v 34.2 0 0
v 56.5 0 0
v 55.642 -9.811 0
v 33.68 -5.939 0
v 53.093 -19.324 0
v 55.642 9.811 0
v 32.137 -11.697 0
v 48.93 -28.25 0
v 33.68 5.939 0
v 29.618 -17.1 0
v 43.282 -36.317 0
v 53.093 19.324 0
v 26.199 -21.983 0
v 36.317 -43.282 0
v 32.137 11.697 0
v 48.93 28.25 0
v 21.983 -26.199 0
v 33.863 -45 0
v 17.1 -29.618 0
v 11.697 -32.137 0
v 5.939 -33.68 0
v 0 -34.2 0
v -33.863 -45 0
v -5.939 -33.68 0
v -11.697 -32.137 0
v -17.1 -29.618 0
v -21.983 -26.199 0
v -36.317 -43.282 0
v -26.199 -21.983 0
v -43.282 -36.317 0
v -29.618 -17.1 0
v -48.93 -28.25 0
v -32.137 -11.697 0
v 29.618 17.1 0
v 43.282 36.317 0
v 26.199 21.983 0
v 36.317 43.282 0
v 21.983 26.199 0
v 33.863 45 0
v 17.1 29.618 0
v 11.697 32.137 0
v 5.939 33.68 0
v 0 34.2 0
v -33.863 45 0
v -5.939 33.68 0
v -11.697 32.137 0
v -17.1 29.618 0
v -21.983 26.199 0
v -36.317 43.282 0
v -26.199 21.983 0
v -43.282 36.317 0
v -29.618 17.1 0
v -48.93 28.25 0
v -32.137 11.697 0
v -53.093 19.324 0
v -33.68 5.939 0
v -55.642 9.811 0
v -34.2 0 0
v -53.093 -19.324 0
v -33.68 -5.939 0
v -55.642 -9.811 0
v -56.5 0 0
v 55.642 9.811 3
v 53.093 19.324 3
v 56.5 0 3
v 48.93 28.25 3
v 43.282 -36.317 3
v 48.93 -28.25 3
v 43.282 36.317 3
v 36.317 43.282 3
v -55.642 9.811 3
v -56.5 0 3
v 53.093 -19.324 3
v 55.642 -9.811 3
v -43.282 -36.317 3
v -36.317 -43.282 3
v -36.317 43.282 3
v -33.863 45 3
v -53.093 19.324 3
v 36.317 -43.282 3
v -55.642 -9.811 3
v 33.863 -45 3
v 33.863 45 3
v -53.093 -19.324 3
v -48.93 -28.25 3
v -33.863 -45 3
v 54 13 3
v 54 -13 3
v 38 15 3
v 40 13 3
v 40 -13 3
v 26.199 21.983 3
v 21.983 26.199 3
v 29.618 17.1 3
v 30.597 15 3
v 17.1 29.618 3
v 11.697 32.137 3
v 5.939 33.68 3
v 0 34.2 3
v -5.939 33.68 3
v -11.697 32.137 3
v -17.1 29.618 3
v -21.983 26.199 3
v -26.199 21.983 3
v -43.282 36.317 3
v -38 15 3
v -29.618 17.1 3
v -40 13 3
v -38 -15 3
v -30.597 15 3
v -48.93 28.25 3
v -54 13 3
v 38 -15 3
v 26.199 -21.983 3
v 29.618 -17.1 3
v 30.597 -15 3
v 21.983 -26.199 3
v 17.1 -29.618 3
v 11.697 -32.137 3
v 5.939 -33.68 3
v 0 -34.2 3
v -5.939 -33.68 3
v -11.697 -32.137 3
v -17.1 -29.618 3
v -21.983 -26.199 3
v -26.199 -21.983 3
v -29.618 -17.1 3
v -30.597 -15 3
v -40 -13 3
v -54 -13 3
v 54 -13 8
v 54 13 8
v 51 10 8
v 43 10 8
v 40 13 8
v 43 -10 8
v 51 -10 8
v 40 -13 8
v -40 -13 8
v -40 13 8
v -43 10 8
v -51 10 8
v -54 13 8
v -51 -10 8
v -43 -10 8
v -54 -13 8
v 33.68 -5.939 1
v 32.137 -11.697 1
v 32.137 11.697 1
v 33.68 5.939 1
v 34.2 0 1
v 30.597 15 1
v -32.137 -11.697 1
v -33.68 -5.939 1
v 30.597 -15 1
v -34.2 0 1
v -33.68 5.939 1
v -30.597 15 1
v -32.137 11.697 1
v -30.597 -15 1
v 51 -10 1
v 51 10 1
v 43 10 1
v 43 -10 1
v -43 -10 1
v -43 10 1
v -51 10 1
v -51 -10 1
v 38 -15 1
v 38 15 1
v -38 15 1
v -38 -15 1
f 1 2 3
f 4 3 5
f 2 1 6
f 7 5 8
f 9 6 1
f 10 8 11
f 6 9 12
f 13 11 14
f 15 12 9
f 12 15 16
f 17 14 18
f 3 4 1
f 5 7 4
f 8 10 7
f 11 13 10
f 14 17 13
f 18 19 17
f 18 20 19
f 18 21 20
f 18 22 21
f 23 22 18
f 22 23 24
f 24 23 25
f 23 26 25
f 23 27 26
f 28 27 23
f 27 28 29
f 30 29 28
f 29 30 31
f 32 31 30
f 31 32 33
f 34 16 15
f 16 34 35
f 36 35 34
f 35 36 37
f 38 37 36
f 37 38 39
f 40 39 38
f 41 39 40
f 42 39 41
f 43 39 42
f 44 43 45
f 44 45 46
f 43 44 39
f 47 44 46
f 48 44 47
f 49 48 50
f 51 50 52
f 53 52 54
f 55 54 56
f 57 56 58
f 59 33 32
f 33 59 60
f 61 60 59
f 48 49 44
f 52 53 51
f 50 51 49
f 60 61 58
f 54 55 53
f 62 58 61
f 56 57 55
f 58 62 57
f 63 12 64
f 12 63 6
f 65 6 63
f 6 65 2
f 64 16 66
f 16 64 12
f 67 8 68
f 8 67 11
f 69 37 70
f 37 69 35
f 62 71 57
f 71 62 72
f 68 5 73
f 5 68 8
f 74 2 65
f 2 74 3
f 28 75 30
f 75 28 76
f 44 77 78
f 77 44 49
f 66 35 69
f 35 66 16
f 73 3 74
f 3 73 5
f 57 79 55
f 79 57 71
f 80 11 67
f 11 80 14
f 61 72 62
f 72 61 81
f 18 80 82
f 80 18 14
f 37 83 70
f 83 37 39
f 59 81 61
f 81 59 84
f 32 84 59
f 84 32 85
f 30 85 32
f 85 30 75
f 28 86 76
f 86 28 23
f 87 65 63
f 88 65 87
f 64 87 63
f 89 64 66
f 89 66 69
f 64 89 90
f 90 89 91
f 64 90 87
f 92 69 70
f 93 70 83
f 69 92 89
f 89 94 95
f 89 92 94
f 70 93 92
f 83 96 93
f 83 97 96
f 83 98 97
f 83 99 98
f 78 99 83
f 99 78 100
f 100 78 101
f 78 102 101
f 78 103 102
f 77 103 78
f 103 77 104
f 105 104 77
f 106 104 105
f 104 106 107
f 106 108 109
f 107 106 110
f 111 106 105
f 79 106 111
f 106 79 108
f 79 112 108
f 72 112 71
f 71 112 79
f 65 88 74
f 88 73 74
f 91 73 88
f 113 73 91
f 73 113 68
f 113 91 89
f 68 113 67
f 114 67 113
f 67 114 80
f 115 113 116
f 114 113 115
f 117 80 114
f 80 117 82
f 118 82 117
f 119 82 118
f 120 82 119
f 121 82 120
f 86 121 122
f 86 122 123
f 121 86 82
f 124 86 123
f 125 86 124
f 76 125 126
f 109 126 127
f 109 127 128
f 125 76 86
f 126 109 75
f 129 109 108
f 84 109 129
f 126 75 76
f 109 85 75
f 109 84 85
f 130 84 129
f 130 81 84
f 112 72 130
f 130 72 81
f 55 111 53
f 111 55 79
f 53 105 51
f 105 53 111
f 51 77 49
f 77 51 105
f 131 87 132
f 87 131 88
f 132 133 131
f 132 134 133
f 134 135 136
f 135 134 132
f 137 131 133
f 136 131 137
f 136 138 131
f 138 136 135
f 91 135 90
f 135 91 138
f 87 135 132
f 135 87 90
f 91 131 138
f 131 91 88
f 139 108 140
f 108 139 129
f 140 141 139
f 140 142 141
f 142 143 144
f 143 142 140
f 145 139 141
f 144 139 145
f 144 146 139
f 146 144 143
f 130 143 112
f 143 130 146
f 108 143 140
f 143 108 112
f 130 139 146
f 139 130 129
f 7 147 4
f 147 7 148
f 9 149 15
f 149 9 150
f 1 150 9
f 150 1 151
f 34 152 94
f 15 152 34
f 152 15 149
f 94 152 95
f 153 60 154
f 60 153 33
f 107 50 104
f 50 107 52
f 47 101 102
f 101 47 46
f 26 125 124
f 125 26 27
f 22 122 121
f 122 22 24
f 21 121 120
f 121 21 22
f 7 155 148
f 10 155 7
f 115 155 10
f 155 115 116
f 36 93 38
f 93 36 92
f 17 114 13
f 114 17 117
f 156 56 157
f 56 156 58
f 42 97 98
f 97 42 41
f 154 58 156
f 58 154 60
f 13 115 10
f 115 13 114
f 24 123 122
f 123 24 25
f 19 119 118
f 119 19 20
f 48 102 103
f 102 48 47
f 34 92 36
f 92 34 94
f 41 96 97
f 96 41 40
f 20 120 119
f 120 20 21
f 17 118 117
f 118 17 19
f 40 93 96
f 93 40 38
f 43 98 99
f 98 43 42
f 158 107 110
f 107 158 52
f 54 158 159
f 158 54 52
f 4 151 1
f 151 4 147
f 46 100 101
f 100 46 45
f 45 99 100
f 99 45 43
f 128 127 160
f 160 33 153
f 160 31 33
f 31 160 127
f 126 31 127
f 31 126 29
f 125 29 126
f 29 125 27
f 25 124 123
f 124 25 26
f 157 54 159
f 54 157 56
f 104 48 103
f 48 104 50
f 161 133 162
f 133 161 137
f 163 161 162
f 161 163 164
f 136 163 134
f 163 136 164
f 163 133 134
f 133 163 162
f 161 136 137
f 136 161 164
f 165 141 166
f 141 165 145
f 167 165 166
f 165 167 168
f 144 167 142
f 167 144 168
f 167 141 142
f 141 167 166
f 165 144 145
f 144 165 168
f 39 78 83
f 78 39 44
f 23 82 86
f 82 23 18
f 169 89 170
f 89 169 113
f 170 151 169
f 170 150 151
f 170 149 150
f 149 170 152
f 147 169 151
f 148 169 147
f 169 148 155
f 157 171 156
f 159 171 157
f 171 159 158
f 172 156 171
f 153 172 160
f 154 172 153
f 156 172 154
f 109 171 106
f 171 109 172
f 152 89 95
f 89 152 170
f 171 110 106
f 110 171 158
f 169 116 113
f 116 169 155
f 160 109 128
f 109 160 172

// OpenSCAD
// PCB_MountBase for Kobalt rounter in Maslow4

ODKobalt = 68 + .4;  // Hole a little bigger
DBase = 113;
HBase = 3;
BrushDist = 80;
BarW = 8;
BarL = 20;
WallT = 3;
WallH = 8;
BrushL = 30;    // Fore and aft of brush mount length
BrushW = 76;    // Width of brushes through the router
$fn = 36;



difference() {
	union() {
      // Base
        cylinder(h=HBase, d=DBase, center=false);
      // Right support
        translate([BrushDist/2, -(BarL + WallT + WallT)/2,0])
            cube([BarW + WallT + WallT, 
                BarL + WallT + WallT, WallH]);
        // Left Support
        translate([-(BrushDist/2 + BarW + WallT + WallT),
            -(BarL + WallT + WallT)/2,0])
            cube([BarW + WallT + WallT, 
                BarL + WallT + WallT, WallH]);

    } 
    // Cut center hole
    translate([0,0,-.1])
      cylinder(h=HBase + 1, d=ODKobalt, center=false);
    // Cut LEFT Slot
    translate([BrushDist/2 + WallT, -(BarL)/2, 1])
        cube([BarW, BarL, WallH]);
    // Cut Right Slot
    translate([-(BrushDist/2 + BarW + WallT),
            -(BarL)/2,1])
        cube([BarW, BarL, WallH]);// Cross section
    // Cut of top of base
    translate([-100,45,-1])
        cube ([200,200,20]);
    // Cut of top of base
    translate([-100,-245,-1])
        cube ([200,200,20]);
    // Pocket for brushes
    translate([-BrushW/2, -BrushL/2, 1])
        cube([BrushW, BrushL, 10]);
	// Cross section view
    //     rotate([0,0,-90])
    //         cube([100,100,100]);

} // D1
